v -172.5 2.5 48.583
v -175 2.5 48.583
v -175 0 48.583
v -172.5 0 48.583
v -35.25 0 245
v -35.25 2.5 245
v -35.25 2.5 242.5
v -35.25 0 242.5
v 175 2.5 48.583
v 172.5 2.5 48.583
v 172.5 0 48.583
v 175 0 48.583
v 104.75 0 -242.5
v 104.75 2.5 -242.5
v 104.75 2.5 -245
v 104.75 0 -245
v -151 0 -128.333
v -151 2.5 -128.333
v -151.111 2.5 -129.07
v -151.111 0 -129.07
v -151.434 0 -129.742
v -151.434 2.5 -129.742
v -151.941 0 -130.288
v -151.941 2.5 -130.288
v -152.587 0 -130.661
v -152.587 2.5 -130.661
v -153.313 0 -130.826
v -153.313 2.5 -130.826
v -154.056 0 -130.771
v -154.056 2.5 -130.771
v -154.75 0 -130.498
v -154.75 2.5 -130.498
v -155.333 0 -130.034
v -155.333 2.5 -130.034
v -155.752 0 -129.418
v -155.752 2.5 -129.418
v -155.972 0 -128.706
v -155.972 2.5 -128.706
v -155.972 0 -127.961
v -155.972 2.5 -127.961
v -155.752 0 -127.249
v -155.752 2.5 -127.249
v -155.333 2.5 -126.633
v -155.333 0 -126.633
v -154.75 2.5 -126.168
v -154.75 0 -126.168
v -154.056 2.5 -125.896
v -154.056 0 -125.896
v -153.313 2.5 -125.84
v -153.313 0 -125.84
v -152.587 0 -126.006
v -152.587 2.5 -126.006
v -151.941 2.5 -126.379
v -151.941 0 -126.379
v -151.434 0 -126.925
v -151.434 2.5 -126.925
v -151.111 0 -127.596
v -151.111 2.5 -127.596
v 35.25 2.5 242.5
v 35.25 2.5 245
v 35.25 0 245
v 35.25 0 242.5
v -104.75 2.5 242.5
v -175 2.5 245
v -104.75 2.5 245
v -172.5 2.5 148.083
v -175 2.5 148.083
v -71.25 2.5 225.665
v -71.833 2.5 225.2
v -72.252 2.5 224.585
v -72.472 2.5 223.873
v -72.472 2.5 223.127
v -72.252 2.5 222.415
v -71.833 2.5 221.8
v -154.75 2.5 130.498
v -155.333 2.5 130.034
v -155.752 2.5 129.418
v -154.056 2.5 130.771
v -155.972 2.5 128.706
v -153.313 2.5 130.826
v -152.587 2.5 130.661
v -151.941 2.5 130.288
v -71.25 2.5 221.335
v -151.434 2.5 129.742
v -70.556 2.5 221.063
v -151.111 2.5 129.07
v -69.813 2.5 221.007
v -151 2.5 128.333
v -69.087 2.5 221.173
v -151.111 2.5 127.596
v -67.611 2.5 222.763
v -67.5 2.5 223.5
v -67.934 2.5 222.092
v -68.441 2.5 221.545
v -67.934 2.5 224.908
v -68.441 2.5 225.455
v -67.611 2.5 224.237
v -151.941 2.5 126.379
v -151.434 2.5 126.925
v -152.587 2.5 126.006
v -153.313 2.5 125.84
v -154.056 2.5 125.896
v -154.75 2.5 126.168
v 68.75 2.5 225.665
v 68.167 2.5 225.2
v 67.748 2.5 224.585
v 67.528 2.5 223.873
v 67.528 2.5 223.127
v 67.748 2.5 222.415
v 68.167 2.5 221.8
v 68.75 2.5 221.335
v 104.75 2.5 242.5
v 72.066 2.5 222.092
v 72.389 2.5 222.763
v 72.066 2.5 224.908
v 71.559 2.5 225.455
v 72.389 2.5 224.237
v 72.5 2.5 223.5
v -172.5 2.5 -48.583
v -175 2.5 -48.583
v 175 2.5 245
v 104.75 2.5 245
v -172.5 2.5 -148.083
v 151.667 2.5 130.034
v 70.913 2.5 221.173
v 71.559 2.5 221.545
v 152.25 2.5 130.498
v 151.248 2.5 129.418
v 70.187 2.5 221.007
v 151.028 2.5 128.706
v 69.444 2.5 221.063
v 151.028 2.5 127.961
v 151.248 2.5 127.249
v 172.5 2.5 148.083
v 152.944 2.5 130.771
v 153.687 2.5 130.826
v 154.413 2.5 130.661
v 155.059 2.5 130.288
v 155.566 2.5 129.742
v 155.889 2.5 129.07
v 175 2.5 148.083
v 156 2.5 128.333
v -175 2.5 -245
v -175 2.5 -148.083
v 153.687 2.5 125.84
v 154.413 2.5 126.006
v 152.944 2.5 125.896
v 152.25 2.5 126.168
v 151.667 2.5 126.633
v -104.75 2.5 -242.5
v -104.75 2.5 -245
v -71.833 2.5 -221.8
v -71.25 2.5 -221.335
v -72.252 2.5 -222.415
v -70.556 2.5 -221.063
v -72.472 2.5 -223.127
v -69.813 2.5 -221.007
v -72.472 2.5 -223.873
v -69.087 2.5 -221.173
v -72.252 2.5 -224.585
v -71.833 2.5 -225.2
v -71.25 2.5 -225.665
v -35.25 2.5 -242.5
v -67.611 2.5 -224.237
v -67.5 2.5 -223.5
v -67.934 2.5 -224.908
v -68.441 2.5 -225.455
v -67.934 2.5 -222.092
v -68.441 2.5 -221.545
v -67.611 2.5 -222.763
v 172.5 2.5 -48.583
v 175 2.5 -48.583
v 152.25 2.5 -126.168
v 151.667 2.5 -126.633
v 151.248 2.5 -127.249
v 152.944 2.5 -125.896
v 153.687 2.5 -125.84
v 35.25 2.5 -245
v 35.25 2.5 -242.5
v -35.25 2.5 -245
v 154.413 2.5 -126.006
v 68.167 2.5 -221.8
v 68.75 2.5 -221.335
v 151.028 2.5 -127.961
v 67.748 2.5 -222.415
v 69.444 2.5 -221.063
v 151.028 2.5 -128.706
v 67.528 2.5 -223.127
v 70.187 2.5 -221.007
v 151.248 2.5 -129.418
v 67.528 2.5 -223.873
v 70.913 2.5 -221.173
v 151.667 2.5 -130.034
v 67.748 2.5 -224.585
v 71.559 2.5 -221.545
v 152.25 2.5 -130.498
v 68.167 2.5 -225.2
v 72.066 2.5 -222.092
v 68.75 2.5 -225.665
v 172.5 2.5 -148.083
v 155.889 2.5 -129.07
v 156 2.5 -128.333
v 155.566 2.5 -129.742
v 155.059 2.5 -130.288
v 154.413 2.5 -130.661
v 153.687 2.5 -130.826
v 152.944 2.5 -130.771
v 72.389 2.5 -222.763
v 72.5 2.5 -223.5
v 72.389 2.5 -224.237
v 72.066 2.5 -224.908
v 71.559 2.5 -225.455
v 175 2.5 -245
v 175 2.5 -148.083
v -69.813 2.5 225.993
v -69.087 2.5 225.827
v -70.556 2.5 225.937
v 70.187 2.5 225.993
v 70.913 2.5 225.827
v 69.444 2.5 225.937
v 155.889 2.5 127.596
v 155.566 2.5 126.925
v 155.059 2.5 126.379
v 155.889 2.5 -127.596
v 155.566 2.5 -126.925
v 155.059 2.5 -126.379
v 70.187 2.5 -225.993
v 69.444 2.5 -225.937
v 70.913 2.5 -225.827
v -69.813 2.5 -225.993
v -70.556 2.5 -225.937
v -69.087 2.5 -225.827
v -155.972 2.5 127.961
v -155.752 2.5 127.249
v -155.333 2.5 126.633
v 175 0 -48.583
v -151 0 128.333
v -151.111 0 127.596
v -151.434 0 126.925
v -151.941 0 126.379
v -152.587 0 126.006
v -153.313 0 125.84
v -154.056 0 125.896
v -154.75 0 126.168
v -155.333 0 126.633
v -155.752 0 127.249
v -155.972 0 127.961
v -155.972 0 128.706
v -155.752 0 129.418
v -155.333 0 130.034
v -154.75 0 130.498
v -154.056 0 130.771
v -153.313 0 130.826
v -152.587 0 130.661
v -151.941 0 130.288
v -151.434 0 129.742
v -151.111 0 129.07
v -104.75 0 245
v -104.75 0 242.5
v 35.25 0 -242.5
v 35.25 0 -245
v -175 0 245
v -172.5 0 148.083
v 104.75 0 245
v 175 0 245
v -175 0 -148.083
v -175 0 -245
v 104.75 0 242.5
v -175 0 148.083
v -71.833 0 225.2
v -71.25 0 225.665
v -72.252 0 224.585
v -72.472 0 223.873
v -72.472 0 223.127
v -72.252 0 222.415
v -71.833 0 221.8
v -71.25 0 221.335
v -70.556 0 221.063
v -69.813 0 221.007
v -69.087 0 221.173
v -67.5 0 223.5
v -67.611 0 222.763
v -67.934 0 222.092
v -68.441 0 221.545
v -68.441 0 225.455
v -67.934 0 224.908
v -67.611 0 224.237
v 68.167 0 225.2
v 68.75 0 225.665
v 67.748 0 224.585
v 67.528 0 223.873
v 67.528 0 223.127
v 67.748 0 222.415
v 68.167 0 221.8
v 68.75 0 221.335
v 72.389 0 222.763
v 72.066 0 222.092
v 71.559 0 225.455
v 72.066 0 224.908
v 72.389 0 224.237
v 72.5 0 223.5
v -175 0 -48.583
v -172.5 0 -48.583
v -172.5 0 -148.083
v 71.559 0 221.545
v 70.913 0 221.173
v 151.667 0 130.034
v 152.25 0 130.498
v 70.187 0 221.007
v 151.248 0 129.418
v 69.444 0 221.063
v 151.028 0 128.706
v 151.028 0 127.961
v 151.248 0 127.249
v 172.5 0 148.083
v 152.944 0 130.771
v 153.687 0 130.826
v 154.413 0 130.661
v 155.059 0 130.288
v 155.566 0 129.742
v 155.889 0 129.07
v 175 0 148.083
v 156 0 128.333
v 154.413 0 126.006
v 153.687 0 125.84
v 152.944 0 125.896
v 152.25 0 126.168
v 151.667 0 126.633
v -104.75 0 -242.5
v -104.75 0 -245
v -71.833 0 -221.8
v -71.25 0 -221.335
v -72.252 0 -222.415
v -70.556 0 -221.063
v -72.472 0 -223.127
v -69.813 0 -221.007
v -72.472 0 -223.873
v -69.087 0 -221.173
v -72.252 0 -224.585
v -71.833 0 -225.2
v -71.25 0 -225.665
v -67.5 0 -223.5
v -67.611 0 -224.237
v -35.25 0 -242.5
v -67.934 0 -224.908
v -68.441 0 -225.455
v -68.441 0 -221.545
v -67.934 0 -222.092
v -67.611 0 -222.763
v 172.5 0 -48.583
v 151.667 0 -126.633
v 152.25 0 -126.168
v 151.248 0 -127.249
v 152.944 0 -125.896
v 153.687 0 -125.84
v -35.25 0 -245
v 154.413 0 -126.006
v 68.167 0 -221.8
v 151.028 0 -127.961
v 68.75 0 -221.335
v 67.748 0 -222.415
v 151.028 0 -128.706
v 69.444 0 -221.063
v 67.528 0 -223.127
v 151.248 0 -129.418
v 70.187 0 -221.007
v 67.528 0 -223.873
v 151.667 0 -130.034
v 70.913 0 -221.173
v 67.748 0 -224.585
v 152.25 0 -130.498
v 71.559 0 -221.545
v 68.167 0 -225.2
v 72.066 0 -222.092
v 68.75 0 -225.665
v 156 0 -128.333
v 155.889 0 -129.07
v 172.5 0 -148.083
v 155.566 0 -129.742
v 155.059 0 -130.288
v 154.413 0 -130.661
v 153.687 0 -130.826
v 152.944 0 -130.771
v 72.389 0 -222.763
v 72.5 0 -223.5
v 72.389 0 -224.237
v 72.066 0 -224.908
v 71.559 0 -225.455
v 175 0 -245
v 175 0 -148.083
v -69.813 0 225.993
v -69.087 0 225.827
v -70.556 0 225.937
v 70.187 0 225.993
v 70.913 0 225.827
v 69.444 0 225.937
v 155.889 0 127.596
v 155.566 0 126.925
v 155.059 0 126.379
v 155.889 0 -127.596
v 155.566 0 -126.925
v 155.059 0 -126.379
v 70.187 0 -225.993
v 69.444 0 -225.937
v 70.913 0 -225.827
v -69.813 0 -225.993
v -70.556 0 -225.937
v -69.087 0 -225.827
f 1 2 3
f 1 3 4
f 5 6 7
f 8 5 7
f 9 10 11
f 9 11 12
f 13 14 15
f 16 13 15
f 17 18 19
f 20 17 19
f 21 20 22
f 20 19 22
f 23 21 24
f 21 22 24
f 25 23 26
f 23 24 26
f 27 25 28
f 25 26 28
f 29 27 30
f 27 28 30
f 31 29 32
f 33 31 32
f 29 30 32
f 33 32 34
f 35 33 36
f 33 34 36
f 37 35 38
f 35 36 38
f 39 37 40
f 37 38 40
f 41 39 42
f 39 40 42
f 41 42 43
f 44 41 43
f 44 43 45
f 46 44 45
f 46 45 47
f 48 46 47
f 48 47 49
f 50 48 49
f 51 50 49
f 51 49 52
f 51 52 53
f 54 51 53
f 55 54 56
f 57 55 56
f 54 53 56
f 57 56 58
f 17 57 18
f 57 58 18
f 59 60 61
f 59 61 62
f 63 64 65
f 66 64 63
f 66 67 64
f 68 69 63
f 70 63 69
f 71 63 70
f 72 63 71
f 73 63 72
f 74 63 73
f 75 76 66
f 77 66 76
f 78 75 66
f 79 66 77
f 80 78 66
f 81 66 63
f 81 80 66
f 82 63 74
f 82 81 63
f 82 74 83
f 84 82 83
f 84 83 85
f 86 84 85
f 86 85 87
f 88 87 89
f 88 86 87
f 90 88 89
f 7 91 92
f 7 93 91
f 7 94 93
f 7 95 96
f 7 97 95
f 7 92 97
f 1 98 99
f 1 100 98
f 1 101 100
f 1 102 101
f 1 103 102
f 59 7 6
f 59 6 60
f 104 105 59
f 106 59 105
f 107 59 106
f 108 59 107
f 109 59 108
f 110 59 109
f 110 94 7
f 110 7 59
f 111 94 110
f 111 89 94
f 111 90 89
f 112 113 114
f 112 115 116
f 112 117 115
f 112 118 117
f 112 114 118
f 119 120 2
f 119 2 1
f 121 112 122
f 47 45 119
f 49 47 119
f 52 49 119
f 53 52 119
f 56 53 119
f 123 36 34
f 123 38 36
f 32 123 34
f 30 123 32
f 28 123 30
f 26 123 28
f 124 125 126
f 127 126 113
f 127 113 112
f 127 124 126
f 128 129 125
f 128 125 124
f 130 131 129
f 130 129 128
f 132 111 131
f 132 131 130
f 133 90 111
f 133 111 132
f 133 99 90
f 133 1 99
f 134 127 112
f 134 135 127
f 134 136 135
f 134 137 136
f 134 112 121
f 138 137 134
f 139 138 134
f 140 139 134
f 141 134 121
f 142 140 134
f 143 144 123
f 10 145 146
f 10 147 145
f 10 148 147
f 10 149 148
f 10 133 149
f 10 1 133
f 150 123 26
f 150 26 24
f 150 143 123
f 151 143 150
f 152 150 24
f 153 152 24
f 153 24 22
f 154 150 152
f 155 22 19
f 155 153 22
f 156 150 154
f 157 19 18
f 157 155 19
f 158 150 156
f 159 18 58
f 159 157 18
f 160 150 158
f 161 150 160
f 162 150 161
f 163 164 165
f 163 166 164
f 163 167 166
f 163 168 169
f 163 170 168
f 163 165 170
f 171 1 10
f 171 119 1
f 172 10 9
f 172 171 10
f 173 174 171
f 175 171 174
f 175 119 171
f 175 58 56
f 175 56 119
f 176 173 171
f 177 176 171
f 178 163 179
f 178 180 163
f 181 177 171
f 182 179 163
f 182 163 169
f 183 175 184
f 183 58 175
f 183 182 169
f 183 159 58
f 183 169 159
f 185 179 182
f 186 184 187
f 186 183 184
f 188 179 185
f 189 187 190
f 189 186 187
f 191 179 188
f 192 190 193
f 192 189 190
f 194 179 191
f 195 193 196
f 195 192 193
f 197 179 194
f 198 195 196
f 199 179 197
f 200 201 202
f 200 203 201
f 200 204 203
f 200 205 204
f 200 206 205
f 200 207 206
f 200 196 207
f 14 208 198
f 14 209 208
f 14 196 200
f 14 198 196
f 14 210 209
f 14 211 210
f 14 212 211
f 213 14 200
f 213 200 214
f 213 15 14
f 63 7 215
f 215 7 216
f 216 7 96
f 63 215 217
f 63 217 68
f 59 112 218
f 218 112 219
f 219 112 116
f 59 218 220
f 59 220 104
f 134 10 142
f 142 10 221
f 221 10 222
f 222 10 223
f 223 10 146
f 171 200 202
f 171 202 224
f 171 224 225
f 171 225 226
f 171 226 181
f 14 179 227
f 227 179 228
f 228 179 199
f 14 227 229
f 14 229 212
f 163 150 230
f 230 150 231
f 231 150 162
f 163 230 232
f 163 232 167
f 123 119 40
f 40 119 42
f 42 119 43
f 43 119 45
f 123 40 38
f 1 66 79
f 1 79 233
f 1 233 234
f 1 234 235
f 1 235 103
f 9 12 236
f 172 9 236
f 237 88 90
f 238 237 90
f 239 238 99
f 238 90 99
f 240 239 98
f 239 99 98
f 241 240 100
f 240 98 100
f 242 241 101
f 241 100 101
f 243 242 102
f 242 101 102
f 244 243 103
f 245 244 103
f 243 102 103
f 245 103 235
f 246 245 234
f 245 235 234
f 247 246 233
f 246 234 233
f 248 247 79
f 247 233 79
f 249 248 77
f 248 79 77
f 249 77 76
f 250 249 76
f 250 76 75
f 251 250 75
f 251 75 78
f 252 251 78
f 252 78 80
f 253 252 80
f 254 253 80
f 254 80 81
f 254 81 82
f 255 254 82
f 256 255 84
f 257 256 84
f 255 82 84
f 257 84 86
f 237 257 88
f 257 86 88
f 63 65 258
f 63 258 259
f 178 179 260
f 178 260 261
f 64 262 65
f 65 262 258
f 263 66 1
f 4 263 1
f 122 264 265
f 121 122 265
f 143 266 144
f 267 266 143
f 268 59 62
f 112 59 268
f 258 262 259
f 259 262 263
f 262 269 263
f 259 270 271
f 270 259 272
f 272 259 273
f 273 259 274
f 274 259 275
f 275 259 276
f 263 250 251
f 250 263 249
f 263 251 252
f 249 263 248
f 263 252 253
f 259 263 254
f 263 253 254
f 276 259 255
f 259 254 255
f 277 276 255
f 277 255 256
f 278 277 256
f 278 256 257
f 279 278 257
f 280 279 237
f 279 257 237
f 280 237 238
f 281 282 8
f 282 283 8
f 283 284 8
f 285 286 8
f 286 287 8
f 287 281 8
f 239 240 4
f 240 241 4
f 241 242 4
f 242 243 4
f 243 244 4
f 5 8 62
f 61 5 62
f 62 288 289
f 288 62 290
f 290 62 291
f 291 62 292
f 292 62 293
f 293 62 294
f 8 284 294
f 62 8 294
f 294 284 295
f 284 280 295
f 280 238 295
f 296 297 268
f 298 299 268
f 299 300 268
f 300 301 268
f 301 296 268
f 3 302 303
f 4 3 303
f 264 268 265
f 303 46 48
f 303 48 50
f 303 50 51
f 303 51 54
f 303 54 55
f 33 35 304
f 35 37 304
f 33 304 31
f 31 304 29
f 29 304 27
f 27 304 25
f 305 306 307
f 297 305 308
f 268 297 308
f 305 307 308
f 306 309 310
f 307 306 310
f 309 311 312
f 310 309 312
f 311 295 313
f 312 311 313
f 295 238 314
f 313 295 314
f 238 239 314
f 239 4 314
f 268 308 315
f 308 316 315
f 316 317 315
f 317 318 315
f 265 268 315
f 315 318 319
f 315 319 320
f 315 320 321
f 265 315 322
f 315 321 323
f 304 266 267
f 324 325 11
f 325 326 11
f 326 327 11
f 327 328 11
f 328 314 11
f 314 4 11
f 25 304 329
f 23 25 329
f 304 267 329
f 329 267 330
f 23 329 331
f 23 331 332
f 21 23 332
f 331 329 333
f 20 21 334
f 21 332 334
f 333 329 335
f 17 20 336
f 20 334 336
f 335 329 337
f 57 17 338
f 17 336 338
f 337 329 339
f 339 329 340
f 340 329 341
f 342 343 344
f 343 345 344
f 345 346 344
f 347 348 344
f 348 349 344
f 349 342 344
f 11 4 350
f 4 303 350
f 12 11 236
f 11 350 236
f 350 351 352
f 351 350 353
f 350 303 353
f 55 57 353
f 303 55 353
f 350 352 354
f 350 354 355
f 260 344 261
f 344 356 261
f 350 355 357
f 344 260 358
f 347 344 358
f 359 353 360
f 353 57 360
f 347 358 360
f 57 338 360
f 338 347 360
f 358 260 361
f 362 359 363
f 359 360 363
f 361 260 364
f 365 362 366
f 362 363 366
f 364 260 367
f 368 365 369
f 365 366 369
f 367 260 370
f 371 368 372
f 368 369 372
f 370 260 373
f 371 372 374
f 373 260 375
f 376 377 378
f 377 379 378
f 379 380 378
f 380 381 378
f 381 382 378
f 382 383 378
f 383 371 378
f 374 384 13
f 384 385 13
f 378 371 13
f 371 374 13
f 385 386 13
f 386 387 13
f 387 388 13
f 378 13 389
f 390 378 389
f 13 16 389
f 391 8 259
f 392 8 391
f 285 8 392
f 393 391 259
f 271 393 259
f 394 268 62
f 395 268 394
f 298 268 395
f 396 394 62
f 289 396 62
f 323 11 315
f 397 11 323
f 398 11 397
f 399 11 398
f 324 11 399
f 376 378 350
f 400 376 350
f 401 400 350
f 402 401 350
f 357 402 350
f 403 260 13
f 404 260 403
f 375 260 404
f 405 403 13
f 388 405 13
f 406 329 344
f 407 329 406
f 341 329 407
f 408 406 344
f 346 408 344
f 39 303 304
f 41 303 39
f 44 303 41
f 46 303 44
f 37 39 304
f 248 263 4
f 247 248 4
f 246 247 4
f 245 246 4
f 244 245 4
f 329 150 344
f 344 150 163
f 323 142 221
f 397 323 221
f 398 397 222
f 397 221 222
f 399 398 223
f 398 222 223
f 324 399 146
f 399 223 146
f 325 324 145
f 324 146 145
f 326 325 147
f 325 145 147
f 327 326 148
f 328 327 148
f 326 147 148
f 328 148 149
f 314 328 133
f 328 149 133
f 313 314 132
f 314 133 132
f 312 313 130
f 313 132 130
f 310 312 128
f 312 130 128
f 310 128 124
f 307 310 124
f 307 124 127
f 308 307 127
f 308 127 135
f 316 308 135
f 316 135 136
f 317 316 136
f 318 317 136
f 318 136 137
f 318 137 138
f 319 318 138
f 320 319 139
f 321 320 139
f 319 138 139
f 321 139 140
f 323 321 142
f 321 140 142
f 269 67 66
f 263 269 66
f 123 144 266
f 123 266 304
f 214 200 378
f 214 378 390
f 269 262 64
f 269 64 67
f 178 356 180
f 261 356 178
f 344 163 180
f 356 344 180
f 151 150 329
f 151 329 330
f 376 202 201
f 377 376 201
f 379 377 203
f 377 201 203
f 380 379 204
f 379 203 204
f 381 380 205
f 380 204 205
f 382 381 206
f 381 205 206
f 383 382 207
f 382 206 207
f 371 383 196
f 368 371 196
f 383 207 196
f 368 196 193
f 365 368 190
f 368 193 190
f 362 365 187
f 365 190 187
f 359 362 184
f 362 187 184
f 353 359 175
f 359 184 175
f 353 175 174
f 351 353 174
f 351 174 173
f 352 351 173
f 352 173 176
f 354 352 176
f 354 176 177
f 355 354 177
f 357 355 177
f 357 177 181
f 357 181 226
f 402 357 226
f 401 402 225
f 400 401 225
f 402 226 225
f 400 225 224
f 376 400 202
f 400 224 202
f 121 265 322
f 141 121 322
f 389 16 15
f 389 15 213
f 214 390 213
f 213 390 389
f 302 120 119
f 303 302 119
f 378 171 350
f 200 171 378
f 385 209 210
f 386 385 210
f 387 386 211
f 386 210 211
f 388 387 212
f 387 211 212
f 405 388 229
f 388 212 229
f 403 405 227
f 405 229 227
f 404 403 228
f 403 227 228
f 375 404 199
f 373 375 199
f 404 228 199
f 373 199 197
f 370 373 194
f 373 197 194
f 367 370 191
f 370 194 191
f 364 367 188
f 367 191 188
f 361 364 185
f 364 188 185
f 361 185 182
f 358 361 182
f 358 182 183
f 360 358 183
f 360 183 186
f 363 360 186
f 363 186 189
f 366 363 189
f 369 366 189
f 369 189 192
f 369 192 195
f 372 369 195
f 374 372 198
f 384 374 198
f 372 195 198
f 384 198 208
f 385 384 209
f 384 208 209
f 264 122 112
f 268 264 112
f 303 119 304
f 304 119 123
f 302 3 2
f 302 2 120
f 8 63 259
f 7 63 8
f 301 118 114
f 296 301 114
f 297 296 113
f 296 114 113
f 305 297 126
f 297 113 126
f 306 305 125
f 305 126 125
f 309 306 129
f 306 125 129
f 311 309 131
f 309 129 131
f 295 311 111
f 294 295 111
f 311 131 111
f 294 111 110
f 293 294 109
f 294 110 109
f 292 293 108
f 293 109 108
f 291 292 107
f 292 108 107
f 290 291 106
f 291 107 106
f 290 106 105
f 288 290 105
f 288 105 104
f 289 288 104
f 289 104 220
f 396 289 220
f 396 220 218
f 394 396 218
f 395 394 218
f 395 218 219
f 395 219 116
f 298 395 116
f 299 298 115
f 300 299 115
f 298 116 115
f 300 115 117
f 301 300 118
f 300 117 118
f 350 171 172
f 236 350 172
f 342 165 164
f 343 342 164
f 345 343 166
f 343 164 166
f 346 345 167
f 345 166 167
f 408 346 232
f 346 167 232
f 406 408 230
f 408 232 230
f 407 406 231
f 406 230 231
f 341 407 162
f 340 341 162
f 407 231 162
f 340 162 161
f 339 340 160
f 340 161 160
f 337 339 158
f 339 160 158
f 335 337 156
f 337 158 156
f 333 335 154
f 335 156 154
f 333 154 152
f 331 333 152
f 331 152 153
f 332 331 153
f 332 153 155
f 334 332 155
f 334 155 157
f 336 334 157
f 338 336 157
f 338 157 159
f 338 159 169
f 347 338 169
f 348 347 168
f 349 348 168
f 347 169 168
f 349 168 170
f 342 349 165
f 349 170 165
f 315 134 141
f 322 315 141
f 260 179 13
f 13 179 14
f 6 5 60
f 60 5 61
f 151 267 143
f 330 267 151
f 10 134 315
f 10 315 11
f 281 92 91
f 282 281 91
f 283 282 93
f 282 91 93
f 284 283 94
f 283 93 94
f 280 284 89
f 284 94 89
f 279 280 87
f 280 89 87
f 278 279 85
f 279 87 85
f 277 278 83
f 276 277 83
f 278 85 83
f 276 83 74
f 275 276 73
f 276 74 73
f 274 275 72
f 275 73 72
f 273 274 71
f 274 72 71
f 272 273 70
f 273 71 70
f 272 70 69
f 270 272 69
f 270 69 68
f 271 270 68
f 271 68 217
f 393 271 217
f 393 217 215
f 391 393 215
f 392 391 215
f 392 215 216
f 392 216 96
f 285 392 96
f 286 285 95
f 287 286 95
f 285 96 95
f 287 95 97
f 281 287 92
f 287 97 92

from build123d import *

# Parameters (mm, degrees)
SKETCH1_W           = 350
SKETCH1_H           = 490
BOSS_EXTRUDE1_DEPTH = 2.5
SKETCH2_R           = 2.5
SKETCH2_W           = 69.5
SKETCH2_H           = 2.5
SKETCH2_W_2         = 2.5
SKETCH2_H_2         = 99.5
CUT_EXTRUDE1_DEPTH  = 2.5


with BuildPart() as part:
    # Sketch1 → Boss-Extrude1 (new body)
    with BuildSketch(Plane(origin=(0, 0, 0), x_dir=(1, 0, 0), z_dir=(0, 1, 0))):
        Rectangle(SKETCH1_W, SKETCH1_H)
    extrude(amount=BOSS_EXTRUDE1_DEPTH)

    # Sketch2 → Cut-Extrude1 (cut)
    with BuildSketch(Plane(origin=(0, 2.5, 0), x_dir=(1, 0, 0), z_dir=(0, 1, 0))):
        with Locations((-70, 223.5)):
            Circle(SKETCH2_R)
        with Locations((70, 223.5)):
            Circle(SKETCH2_R)
        with Locations((70, -223.5)):
            Circle(SKETCH2_R)
        with Locations((-70, -223.5)):
            Circle(SKETCH2_R)
        with Locations((-153.5, 128.333333333)):
            Circle(SKETCH2_R)
        with Locations((-153.5, -128.333333333)):
            Circle(SKETCH2_R)
        with Locations((153.5, -128.333333333)):
            Circle(SKETCH2_R)
        with Locations((153.5, 128.333333333)):
            Circle(SKETCH2_R)
        with Locations((-70, 243.75)):
            Rectangle(SKETCH2_W, SKETCH2_H)
        with Locations((-173.75, 98.333333333)):
            Rectangle(SKETCH2_W_2, SKETCH2_H_2)
        with Locations((70, 243.75)):
            Rectangle(SKETCH2_W, SKETCH2_H)
        with Locations((-173.75, -98.333333333)):
            Rectangle(SKETCH2_W_2, SKETCH2_H_2)
        with Locations((173.75, -98.333333333)):
            Rectangle(SKETCH2_W_2, SKETCH2_H_2)
        with Locations((173.75, 98.333333333)):
            Rectangle(SKETCH2_W_2, SKETCH2_H_2)
        with Locations((70, -243.75)):
            Rectangle(SKETCH2_W, SKETCH2_H)
        with Locations((-70, -243.75)):
            Rectangle(SKETCH2_W, SKETCH2_H)
    extrude(amount=-CUT_EXTRUDE1_DEPTH, mode=Mode.SUBTRACT)


solid = part.part
